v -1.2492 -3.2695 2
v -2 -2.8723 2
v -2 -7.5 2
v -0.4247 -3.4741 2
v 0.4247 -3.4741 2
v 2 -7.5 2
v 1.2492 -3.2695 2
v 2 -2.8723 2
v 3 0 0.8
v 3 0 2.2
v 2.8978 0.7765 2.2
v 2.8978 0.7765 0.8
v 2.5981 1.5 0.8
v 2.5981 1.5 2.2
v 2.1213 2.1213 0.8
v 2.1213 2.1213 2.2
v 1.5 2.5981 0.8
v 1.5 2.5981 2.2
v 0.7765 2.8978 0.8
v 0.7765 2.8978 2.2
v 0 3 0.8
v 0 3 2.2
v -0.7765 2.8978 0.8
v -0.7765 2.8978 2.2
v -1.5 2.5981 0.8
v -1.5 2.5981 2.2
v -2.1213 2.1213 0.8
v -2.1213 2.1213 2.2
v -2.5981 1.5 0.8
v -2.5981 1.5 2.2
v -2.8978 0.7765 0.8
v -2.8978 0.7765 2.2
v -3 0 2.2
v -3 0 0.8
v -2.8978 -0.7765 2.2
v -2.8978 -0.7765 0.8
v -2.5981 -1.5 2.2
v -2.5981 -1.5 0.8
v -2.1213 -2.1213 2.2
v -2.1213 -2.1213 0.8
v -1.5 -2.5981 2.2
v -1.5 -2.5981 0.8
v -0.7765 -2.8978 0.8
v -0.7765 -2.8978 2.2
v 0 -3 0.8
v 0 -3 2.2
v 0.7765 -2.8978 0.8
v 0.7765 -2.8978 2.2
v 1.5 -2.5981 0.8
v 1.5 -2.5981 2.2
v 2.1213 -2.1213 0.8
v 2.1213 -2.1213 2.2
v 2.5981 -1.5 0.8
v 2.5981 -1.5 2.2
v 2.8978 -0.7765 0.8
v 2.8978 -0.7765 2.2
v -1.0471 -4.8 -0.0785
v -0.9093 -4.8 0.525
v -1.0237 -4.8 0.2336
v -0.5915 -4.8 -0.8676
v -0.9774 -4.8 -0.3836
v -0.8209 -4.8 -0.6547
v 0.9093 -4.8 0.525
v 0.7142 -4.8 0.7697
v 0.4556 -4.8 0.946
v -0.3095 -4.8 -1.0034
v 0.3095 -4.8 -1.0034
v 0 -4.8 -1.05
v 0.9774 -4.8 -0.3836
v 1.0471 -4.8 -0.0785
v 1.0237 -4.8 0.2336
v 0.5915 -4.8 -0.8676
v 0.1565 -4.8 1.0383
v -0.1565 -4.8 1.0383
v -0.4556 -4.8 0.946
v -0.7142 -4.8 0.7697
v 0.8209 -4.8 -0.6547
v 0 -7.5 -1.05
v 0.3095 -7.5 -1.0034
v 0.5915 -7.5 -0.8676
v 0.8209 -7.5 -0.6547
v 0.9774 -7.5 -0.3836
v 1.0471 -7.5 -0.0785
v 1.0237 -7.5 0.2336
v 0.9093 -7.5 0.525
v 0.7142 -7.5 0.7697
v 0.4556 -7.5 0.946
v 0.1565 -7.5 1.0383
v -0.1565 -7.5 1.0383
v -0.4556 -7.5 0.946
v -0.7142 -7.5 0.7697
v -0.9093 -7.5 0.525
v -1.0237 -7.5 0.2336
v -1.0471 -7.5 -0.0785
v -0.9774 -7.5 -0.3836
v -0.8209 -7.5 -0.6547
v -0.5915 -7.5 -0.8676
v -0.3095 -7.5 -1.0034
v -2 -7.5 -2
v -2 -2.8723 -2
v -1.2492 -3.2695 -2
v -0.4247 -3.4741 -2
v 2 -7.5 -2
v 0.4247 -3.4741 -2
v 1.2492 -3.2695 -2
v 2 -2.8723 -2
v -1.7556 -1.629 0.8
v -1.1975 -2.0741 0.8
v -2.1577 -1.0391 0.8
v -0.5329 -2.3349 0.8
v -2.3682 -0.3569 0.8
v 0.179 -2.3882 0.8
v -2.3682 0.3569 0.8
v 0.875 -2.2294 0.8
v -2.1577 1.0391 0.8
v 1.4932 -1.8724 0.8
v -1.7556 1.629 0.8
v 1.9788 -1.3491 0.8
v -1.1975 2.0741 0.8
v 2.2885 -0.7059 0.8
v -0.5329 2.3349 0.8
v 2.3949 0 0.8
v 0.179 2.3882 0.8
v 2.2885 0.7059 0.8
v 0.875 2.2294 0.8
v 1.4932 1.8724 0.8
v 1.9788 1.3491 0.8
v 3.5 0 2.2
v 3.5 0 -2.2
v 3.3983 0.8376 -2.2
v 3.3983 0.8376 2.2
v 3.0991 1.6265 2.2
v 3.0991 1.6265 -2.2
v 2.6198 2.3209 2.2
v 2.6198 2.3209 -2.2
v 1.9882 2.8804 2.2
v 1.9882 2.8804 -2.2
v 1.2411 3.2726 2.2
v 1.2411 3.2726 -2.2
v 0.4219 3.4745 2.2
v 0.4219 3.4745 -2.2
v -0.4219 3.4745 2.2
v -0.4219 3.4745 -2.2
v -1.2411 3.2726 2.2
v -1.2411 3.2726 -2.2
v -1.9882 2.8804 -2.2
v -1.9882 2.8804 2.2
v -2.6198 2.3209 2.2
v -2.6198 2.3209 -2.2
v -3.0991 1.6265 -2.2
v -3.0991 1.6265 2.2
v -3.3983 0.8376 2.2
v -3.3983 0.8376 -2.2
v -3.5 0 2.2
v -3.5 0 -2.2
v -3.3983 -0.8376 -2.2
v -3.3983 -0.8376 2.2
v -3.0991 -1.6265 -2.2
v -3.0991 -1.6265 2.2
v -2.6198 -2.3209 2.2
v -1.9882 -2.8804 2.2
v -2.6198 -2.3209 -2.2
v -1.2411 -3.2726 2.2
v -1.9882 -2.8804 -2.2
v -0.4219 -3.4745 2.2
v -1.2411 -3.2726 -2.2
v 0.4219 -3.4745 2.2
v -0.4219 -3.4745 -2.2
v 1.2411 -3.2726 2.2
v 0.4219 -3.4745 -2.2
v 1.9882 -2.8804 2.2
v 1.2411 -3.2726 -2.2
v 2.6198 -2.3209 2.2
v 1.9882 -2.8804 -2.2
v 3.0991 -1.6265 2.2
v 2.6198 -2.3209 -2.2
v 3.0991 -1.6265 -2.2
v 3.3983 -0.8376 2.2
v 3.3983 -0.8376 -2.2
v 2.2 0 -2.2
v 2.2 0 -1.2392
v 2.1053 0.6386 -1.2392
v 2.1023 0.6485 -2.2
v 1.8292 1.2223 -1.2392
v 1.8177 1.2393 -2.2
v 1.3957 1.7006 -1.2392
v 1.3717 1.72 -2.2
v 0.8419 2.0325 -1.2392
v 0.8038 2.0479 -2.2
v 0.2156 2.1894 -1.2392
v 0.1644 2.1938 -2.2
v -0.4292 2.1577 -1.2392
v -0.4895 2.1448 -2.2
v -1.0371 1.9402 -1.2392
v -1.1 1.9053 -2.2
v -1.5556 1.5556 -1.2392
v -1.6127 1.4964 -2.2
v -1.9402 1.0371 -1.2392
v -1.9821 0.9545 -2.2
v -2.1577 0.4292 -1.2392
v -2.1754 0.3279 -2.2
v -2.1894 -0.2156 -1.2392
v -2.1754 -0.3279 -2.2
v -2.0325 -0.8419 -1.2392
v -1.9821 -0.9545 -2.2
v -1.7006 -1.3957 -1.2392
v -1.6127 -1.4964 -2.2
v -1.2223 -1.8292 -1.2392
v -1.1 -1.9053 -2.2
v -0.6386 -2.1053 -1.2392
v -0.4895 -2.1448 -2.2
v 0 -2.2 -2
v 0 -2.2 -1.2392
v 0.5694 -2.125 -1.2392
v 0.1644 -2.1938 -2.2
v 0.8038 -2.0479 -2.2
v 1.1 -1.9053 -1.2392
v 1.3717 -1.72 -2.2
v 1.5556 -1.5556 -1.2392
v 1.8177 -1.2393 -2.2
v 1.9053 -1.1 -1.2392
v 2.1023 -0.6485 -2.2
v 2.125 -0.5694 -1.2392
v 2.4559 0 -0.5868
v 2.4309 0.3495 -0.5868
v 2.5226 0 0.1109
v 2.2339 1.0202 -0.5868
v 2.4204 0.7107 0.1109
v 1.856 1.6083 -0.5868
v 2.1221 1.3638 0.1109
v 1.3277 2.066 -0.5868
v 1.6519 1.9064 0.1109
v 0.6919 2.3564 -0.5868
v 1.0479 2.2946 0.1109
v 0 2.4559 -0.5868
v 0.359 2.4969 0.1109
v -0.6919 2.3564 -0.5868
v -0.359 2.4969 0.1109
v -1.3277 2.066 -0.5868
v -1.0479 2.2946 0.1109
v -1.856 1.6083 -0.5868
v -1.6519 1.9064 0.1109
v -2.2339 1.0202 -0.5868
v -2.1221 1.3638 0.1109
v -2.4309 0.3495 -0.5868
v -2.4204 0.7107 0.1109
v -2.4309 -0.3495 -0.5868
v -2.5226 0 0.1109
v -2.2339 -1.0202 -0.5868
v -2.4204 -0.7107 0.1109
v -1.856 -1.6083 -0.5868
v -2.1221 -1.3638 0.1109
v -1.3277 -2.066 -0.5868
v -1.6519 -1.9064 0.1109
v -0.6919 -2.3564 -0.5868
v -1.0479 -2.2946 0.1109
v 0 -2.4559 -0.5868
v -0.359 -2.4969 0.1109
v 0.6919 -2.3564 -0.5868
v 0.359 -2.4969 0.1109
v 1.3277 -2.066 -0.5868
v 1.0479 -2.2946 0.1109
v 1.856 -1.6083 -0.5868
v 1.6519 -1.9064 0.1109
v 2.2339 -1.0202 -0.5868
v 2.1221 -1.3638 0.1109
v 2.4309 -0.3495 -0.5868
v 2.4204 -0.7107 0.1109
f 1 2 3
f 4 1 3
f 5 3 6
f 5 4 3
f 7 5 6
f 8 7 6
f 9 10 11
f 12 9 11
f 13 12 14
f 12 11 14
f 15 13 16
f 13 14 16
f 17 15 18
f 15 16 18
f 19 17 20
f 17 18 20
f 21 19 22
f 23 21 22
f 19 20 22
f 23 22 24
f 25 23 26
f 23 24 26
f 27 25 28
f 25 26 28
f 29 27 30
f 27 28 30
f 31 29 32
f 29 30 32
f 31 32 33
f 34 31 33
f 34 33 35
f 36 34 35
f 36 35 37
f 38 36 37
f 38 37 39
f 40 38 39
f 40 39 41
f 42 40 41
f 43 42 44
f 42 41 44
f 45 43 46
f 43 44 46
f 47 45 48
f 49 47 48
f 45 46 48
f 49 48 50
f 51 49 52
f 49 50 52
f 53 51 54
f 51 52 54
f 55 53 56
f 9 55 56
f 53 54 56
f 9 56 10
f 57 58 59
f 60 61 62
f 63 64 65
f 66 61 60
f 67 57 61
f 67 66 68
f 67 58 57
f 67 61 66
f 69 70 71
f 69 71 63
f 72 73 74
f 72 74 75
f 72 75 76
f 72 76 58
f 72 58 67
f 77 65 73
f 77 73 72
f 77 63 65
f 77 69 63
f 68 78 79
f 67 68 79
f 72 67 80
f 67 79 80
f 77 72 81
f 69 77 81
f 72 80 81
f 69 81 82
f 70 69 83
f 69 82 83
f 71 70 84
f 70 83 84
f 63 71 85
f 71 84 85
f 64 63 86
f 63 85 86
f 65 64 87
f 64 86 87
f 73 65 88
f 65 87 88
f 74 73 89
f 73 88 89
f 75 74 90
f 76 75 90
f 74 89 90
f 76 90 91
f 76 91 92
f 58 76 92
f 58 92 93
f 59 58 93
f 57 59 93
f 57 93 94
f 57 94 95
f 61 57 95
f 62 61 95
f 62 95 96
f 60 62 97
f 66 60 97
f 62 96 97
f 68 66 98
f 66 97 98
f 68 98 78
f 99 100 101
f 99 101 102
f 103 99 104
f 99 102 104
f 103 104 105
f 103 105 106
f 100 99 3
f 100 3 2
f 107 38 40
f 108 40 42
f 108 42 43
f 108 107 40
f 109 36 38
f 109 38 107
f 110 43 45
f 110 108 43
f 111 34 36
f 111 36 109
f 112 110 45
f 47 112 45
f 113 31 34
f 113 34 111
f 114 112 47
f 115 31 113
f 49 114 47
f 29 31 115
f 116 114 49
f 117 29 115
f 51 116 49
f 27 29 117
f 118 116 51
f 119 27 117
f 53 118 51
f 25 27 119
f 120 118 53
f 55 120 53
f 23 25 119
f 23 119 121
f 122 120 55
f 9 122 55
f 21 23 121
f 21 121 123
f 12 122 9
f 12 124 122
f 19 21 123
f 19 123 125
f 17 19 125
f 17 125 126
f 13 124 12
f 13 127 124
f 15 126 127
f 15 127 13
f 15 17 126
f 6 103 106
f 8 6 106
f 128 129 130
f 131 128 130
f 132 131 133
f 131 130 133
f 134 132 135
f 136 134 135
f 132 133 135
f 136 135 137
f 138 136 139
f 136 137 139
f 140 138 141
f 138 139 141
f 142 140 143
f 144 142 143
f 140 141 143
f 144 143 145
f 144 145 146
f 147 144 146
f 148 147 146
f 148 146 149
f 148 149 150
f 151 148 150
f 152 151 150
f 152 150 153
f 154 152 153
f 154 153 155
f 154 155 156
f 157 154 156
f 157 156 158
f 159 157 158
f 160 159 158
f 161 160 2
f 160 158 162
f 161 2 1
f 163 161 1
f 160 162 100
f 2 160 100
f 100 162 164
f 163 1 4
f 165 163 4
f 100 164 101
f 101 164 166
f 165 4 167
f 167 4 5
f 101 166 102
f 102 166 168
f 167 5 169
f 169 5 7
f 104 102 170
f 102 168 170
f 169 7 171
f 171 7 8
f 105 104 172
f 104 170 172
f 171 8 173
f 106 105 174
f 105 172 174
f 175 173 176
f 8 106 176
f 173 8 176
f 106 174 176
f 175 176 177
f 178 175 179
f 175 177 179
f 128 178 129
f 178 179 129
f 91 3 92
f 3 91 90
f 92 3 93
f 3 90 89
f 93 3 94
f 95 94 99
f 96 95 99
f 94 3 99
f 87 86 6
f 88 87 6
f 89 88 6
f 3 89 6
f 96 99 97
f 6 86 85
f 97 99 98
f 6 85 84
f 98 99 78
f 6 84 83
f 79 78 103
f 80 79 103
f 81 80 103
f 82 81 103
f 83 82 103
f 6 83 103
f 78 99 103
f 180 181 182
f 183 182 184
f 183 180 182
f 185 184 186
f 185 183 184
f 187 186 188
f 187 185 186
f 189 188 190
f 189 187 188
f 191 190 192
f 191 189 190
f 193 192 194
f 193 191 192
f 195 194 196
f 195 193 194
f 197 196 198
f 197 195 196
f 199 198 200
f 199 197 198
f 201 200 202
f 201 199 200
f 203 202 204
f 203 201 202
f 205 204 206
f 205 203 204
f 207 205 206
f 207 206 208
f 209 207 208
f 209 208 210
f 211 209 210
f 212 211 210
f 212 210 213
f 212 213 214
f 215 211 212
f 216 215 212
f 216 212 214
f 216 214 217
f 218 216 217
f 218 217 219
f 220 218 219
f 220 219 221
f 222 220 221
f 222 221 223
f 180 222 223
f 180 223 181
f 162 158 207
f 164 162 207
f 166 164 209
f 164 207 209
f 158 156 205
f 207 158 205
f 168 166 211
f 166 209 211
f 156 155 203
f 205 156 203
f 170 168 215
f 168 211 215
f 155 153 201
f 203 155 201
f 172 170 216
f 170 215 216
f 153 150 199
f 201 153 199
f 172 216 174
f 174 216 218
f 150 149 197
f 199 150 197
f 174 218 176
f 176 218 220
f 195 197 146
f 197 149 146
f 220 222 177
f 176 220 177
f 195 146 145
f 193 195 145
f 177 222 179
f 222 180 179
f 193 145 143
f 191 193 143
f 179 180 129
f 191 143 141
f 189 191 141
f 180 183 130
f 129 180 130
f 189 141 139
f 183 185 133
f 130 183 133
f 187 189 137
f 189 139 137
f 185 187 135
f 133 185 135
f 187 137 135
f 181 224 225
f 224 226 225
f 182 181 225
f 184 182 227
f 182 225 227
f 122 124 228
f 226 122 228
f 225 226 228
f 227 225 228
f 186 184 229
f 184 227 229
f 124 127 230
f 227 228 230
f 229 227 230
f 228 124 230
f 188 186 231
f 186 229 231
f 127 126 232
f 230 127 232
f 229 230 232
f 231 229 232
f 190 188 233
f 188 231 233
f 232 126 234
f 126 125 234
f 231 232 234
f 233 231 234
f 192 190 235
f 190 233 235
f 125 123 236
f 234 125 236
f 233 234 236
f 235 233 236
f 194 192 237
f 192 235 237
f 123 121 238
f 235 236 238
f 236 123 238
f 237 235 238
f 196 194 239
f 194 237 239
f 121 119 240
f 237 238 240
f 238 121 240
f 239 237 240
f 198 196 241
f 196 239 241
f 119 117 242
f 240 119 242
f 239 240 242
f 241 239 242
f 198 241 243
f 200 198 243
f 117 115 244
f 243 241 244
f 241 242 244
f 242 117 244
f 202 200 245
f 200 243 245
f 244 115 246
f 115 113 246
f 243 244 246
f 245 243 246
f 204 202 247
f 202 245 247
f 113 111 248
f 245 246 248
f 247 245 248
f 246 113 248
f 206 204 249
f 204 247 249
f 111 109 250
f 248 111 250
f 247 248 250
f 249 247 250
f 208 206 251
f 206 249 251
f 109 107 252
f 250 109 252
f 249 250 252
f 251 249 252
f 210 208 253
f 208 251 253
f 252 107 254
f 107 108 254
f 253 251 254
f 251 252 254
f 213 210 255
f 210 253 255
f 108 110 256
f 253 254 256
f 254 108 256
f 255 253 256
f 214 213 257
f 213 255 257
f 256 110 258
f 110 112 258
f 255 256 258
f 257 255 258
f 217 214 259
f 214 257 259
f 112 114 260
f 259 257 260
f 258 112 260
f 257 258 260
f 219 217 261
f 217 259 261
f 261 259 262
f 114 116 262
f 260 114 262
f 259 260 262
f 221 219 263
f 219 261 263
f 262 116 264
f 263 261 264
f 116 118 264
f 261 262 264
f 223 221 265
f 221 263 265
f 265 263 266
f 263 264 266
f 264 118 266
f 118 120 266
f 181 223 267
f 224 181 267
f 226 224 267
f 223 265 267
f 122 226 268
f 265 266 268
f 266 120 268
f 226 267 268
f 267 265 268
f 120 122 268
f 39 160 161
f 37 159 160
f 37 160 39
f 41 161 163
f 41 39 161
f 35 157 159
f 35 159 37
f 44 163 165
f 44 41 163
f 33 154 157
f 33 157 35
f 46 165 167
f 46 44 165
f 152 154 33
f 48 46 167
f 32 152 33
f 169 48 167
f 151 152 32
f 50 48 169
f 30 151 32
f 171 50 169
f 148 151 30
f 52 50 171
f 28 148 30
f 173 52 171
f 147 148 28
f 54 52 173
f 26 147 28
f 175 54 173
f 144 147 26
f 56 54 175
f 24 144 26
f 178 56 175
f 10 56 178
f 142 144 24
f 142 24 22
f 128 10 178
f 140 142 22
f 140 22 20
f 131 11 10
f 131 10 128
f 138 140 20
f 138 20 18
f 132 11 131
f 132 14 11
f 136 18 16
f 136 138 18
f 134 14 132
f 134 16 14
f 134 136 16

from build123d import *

# Parameters (mm, degrees)
SOCKET_OUTER_EYE_AND_MOUTHS_START              = -2.2
SKETCH1_R                                      = 3.5
SKETCH1_R_2                                    = 2.2
SOCKET_OUTER_EYE_AND_MOUTHS_DEPTH              = 4.4
ROD_CONNECTION_NECK_START                      = -2
SKETCH2_W                                      = 4
SKETCH2_H                                      = 5.3
ROD_CONNECTION_NECK_DEPTH                      = 4
SKETCH3_R                                      = 1.05
D2P1_ROD_BOND_BORE_DEPTH                       = 2.7
SKETCH4_R                                      = 3
REVB_M6X0P35_CAP_FEMALE_THREAD_MAJOR_POC_DEPTH = 1.4


# Read off the part's stored shape, not the designer's step: Spherical_Socket_D5p05
with BuildPart() as part:
    # Sketch1 → Socket_Outer_Eye_And_Mouths (new body)
    with BuildSketch(Plane.XY.offset(SOCKET_OUTER_EYE_AND_MOUTHS_START)):
        Circle(SKETCH1_R)
        Circle(SKETCH1_R_2, mode=Mode.SUBTRACT)
    extrude(amount=SOCKET_OUTER_EYE_AND_MOUTHS_DEPTH)

    # Sketch2 → Rod_Connection_Neck (add)
    with BuildSketch(Plane.XY.offset(ROD_CONNECTION_NECK_START)):
        with Locations((0, -4.85)):
            Rectangle(SKETCH2_W, SKETCH2_H)
    extrude(amount=ROD_CONNECTION_NECK_DEPTH)

    # Spherical_Socket_D5p05 outline → Spherical_Socket_D5p05 (revolve, cut)
    with BuildSketch(Plane.XZ):
        with BuildLine():
            Line((2.199999999, 1.239203375), (2.199999999, -1.239203375))
            ThreePointArc((2.199999999, -1.239203375), (2.525, 0), (2.199999999, 1.239203375))
        make_face()
    revolve(axis=Axis((0, 0, 0), (0, 0, 1)), mode=Mode.SUBTRACT)

    # Sketch3 → D2p1_Rod_Bond_Bore (cut)
    with BuildSketch(Plane.XZ.offset(7.5)):
        with Locations(Location((0, 0, 0), (0, 0, 270))):
            Circle(SKETCH3_R)
    extrude(amount=-D2P1_ROD_BOND_BORE_DEPTH, mode=Mode.SUBTRACT)

    # Sketch4 → RevB_M6x0p35_Cap_Female_Thread_Major_Pocket (cut)
    with BuildSketch(Plane.XY.offset(2.2)):
        Circle(SKETCH4_R)
    extrude(amount=-REVB_M6X0P35_CAP_FEMALE_THREAD_MAJOR_POC_DEPTH, mode=Mode.SUBTRACT)


solid = part.part
